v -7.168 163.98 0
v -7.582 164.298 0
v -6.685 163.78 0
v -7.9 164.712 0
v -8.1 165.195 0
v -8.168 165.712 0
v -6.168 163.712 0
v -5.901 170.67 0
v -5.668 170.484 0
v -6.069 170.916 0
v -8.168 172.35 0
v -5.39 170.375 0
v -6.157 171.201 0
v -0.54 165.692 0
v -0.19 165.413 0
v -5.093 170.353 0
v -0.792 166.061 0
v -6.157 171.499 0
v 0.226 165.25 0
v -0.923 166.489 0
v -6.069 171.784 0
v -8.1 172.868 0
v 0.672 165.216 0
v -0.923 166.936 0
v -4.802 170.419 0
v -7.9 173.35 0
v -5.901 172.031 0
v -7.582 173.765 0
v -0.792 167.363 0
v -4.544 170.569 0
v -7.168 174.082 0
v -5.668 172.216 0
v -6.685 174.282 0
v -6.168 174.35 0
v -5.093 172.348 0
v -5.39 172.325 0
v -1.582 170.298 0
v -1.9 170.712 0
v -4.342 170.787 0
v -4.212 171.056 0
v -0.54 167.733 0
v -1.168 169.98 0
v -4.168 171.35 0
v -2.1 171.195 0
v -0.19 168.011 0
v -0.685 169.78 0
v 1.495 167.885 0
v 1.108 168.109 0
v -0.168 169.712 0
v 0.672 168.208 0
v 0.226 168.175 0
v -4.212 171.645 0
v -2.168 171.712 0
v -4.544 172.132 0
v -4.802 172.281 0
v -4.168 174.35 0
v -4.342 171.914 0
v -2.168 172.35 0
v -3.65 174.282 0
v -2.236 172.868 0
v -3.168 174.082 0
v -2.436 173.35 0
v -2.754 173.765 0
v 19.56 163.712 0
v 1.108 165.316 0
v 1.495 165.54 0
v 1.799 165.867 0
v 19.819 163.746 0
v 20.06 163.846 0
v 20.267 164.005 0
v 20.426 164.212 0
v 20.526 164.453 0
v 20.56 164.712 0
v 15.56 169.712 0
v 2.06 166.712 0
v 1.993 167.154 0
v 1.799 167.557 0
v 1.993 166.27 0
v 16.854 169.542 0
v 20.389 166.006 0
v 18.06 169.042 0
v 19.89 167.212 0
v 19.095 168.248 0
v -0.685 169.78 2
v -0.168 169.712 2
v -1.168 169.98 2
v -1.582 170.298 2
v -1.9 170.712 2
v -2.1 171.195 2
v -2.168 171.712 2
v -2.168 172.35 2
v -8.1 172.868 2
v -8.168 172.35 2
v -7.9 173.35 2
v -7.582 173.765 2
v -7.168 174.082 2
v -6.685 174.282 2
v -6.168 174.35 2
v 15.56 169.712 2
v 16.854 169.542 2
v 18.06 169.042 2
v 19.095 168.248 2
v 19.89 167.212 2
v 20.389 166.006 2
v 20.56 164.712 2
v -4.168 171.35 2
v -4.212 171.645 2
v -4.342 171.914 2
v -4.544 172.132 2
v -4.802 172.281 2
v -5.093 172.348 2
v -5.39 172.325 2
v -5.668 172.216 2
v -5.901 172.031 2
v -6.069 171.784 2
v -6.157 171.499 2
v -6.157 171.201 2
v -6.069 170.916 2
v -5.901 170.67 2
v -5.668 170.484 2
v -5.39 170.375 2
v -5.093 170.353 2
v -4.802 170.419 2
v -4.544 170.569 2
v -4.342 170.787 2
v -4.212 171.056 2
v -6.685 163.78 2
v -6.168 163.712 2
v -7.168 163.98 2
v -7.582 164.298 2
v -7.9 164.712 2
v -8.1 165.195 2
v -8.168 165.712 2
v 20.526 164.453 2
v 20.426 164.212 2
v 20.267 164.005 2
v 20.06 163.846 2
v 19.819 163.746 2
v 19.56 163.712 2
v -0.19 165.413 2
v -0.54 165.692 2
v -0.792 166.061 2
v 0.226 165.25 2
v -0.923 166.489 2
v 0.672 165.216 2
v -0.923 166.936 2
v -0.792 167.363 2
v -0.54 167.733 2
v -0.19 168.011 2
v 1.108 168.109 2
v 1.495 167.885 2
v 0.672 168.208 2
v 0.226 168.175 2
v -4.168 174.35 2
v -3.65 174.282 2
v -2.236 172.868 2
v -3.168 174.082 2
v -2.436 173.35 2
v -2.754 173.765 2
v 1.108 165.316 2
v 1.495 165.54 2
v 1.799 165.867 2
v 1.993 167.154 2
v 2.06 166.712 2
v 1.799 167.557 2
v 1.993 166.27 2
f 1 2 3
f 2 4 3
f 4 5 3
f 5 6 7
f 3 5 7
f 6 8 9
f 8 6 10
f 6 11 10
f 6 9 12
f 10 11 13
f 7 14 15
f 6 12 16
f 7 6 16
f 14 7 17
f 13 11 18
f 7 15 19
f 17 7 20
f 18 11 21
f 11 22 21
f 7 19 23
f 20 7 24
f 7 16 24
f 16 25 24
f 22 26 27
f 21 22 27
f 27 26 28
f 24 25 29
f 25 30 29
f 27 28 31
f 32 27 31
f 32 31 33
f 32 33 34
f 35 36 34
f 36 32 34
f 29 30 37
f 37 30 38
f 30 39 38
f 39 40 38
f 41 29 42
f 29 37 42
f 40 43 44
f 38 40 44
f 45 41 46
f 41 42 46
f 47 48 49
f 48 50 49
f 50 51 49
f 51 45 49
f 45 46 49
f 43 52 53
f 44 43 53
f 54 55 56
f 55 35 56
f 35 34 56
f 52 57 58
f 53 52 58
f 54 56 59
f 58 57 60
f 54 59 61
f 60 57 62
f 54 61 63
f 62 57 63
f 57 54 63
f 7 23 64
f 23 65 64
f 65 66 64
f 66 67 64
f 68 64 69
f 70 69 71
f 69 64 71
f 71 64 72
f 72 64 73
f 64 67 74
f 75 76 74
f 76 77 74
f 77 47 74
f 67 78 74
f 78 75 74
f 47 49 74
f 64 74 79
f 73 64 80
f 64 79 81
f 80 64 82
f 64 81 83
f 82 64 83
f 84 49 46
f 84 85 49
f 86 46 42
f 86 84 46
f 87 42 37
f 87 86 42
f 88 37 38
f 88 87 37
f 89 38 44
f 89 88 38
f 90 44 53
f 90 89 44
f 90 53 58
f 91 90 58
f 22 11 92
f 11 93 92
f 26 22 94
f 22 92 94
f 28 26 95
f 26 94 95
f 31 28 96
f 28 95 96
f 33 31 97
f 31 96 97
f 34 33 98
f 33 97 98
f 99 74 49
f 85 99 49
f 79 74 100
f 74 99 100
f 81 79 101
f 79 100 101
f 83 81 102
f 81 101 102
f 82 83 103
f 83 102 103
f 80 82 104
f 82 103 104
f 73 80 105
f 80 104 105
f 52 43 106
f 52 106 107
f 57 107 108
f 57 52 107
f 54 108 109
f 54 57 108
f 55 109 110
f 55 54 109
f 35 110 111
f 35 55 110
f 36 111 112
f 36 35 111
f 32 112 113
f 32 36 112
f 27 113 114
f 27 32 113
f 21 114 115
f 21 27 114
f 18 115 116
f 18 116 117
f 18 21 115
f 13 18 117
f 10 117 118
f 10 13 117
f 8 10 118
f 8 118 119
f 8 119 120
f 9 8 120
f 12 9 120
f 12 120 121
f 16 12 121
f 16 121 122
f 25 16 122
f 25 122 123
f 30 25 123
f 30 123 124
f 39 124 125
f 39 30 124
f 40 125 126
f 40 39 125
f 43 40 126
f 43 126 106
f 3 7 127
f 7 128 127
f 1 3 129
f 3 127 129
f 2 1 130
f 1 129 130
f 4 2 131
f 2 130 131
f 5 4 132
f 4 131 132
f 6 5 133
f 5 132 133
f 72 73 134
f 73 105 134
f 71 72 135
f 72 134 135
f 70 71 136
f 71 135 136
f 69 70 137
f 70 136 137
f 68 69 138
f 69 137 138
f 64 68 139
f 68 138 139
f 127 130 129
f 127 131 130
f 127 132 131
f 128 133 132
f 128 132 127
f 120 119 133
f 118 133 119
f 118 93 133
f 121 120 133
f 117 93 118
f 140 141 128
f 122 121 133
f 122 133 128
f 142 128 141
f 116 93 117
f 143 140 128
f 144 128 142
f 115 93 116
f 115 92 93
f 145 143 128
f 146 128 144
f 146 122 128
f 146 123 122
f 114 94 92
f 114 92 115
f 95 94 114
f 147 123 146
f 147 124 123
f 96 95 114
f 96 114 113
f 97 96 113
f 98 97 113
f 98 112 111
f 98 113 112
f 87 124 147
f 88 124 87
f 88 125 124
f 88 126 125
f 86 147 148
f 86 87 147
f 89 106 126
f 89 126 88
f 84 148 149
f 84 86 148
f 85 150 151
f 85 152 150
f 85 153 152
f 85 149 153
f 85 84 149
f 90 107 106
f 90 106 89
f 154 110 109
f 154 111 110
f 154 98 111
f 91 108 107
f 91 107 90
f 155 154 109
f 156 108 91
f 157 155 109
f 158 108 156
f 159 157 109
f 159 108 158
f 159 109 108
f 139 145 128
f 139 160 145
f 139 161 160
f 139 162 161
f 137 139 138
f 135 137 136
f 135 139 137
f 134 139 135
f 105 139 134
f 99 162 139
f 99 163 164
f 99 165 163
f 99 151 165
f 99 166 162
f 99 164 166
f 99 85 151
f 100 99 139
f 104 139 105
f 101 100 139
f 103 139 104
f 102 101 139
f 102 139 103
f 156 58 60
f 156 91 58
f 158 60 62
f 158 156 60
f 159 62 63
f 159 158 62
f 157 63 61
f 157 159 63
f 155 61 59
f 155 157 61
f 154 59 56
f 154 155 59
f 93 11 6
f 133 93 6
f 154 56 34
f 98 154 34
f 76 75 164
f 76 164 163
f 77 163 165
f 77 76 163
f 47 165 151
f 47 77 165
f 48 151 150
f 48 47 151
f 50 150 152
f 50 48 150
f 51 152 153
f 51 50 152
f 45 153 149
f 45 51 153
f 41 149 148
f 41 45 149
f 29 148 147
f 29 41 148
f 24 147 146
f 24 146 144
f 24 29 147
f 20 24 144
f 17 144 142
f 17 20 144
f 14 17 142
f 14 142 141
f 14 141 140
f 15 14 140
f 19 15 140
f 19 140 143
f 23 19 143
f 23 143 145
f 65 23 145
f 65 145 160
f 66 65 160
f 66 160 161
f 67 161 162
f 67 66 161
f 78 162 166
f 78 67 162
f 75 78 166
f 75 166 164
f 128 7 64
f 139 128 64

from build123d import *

# Parameters (mm, degrees)
SKETCH1_R           = 1.5
SKETCH1_R_2         = 1
BOSS_EXTRUDE1_DEPTH = 2
FILLET7_R           = 5
FILLET8_R           = 1
FILLET9_R           = 2


with BuildPart() as part:
    # Sketch1 → Boss-Extrude1 (new body)
    with BuildSketch(Plane.XY):
        Polygon((-2.167750967, 169.712259216), (-2.167750967, 174.350350498), (-8.167750967, 174.350350498), (-8.167750967, 163.712259216), (0.596545219, 163.712259216), (20.559814769, 163.712259216), (20.559814769, 169.712259216), align=None)
        with Locations((0.559814769, 166.712259216)):
            Circle(SKETCH1_R, mode=Mode.SUBTRACT)
        with Locations((-5.167750967, 171.350350498)):
            Circle(SKETCH1_R_2, mode=Mode.SUBTRACT)
    extrude(amount=BOSS_EXTRUDE1_DEPTH)

    # Fillet7
    fillet7_edges = [part.edges().sort_by_distance(p)[0] for p in [
        (20.559814769, 169.712259216, 1),
    ]]
    fillet(fillet7_edges, radius=FILLET7_R)

    # Fillet8
    fillet8_edges = [part.edges().sort_by_distance(p)[0] for p in [
        (20.559814769, 163.712259216, 1),
    ]]
    fillet(fillet8_edges, radius=FILLET8_R - 0.0001)  # a hair under: the kernel refuses the full size

    # Fillet9
    fillet9_edges = [part.edges().sort_by_distance(p)[0] for p in [
        (-8.167750967, 174.350350498, 1),
        (-2.167750967, 174.350350498, 1),
        (-2.167750967, 169.712259216, 1),
        (-8.167750967, 163.712259216, 1),
    ]]
    fillet(fillet9_edges, radius=FILLET9_R)


solid = part.part
